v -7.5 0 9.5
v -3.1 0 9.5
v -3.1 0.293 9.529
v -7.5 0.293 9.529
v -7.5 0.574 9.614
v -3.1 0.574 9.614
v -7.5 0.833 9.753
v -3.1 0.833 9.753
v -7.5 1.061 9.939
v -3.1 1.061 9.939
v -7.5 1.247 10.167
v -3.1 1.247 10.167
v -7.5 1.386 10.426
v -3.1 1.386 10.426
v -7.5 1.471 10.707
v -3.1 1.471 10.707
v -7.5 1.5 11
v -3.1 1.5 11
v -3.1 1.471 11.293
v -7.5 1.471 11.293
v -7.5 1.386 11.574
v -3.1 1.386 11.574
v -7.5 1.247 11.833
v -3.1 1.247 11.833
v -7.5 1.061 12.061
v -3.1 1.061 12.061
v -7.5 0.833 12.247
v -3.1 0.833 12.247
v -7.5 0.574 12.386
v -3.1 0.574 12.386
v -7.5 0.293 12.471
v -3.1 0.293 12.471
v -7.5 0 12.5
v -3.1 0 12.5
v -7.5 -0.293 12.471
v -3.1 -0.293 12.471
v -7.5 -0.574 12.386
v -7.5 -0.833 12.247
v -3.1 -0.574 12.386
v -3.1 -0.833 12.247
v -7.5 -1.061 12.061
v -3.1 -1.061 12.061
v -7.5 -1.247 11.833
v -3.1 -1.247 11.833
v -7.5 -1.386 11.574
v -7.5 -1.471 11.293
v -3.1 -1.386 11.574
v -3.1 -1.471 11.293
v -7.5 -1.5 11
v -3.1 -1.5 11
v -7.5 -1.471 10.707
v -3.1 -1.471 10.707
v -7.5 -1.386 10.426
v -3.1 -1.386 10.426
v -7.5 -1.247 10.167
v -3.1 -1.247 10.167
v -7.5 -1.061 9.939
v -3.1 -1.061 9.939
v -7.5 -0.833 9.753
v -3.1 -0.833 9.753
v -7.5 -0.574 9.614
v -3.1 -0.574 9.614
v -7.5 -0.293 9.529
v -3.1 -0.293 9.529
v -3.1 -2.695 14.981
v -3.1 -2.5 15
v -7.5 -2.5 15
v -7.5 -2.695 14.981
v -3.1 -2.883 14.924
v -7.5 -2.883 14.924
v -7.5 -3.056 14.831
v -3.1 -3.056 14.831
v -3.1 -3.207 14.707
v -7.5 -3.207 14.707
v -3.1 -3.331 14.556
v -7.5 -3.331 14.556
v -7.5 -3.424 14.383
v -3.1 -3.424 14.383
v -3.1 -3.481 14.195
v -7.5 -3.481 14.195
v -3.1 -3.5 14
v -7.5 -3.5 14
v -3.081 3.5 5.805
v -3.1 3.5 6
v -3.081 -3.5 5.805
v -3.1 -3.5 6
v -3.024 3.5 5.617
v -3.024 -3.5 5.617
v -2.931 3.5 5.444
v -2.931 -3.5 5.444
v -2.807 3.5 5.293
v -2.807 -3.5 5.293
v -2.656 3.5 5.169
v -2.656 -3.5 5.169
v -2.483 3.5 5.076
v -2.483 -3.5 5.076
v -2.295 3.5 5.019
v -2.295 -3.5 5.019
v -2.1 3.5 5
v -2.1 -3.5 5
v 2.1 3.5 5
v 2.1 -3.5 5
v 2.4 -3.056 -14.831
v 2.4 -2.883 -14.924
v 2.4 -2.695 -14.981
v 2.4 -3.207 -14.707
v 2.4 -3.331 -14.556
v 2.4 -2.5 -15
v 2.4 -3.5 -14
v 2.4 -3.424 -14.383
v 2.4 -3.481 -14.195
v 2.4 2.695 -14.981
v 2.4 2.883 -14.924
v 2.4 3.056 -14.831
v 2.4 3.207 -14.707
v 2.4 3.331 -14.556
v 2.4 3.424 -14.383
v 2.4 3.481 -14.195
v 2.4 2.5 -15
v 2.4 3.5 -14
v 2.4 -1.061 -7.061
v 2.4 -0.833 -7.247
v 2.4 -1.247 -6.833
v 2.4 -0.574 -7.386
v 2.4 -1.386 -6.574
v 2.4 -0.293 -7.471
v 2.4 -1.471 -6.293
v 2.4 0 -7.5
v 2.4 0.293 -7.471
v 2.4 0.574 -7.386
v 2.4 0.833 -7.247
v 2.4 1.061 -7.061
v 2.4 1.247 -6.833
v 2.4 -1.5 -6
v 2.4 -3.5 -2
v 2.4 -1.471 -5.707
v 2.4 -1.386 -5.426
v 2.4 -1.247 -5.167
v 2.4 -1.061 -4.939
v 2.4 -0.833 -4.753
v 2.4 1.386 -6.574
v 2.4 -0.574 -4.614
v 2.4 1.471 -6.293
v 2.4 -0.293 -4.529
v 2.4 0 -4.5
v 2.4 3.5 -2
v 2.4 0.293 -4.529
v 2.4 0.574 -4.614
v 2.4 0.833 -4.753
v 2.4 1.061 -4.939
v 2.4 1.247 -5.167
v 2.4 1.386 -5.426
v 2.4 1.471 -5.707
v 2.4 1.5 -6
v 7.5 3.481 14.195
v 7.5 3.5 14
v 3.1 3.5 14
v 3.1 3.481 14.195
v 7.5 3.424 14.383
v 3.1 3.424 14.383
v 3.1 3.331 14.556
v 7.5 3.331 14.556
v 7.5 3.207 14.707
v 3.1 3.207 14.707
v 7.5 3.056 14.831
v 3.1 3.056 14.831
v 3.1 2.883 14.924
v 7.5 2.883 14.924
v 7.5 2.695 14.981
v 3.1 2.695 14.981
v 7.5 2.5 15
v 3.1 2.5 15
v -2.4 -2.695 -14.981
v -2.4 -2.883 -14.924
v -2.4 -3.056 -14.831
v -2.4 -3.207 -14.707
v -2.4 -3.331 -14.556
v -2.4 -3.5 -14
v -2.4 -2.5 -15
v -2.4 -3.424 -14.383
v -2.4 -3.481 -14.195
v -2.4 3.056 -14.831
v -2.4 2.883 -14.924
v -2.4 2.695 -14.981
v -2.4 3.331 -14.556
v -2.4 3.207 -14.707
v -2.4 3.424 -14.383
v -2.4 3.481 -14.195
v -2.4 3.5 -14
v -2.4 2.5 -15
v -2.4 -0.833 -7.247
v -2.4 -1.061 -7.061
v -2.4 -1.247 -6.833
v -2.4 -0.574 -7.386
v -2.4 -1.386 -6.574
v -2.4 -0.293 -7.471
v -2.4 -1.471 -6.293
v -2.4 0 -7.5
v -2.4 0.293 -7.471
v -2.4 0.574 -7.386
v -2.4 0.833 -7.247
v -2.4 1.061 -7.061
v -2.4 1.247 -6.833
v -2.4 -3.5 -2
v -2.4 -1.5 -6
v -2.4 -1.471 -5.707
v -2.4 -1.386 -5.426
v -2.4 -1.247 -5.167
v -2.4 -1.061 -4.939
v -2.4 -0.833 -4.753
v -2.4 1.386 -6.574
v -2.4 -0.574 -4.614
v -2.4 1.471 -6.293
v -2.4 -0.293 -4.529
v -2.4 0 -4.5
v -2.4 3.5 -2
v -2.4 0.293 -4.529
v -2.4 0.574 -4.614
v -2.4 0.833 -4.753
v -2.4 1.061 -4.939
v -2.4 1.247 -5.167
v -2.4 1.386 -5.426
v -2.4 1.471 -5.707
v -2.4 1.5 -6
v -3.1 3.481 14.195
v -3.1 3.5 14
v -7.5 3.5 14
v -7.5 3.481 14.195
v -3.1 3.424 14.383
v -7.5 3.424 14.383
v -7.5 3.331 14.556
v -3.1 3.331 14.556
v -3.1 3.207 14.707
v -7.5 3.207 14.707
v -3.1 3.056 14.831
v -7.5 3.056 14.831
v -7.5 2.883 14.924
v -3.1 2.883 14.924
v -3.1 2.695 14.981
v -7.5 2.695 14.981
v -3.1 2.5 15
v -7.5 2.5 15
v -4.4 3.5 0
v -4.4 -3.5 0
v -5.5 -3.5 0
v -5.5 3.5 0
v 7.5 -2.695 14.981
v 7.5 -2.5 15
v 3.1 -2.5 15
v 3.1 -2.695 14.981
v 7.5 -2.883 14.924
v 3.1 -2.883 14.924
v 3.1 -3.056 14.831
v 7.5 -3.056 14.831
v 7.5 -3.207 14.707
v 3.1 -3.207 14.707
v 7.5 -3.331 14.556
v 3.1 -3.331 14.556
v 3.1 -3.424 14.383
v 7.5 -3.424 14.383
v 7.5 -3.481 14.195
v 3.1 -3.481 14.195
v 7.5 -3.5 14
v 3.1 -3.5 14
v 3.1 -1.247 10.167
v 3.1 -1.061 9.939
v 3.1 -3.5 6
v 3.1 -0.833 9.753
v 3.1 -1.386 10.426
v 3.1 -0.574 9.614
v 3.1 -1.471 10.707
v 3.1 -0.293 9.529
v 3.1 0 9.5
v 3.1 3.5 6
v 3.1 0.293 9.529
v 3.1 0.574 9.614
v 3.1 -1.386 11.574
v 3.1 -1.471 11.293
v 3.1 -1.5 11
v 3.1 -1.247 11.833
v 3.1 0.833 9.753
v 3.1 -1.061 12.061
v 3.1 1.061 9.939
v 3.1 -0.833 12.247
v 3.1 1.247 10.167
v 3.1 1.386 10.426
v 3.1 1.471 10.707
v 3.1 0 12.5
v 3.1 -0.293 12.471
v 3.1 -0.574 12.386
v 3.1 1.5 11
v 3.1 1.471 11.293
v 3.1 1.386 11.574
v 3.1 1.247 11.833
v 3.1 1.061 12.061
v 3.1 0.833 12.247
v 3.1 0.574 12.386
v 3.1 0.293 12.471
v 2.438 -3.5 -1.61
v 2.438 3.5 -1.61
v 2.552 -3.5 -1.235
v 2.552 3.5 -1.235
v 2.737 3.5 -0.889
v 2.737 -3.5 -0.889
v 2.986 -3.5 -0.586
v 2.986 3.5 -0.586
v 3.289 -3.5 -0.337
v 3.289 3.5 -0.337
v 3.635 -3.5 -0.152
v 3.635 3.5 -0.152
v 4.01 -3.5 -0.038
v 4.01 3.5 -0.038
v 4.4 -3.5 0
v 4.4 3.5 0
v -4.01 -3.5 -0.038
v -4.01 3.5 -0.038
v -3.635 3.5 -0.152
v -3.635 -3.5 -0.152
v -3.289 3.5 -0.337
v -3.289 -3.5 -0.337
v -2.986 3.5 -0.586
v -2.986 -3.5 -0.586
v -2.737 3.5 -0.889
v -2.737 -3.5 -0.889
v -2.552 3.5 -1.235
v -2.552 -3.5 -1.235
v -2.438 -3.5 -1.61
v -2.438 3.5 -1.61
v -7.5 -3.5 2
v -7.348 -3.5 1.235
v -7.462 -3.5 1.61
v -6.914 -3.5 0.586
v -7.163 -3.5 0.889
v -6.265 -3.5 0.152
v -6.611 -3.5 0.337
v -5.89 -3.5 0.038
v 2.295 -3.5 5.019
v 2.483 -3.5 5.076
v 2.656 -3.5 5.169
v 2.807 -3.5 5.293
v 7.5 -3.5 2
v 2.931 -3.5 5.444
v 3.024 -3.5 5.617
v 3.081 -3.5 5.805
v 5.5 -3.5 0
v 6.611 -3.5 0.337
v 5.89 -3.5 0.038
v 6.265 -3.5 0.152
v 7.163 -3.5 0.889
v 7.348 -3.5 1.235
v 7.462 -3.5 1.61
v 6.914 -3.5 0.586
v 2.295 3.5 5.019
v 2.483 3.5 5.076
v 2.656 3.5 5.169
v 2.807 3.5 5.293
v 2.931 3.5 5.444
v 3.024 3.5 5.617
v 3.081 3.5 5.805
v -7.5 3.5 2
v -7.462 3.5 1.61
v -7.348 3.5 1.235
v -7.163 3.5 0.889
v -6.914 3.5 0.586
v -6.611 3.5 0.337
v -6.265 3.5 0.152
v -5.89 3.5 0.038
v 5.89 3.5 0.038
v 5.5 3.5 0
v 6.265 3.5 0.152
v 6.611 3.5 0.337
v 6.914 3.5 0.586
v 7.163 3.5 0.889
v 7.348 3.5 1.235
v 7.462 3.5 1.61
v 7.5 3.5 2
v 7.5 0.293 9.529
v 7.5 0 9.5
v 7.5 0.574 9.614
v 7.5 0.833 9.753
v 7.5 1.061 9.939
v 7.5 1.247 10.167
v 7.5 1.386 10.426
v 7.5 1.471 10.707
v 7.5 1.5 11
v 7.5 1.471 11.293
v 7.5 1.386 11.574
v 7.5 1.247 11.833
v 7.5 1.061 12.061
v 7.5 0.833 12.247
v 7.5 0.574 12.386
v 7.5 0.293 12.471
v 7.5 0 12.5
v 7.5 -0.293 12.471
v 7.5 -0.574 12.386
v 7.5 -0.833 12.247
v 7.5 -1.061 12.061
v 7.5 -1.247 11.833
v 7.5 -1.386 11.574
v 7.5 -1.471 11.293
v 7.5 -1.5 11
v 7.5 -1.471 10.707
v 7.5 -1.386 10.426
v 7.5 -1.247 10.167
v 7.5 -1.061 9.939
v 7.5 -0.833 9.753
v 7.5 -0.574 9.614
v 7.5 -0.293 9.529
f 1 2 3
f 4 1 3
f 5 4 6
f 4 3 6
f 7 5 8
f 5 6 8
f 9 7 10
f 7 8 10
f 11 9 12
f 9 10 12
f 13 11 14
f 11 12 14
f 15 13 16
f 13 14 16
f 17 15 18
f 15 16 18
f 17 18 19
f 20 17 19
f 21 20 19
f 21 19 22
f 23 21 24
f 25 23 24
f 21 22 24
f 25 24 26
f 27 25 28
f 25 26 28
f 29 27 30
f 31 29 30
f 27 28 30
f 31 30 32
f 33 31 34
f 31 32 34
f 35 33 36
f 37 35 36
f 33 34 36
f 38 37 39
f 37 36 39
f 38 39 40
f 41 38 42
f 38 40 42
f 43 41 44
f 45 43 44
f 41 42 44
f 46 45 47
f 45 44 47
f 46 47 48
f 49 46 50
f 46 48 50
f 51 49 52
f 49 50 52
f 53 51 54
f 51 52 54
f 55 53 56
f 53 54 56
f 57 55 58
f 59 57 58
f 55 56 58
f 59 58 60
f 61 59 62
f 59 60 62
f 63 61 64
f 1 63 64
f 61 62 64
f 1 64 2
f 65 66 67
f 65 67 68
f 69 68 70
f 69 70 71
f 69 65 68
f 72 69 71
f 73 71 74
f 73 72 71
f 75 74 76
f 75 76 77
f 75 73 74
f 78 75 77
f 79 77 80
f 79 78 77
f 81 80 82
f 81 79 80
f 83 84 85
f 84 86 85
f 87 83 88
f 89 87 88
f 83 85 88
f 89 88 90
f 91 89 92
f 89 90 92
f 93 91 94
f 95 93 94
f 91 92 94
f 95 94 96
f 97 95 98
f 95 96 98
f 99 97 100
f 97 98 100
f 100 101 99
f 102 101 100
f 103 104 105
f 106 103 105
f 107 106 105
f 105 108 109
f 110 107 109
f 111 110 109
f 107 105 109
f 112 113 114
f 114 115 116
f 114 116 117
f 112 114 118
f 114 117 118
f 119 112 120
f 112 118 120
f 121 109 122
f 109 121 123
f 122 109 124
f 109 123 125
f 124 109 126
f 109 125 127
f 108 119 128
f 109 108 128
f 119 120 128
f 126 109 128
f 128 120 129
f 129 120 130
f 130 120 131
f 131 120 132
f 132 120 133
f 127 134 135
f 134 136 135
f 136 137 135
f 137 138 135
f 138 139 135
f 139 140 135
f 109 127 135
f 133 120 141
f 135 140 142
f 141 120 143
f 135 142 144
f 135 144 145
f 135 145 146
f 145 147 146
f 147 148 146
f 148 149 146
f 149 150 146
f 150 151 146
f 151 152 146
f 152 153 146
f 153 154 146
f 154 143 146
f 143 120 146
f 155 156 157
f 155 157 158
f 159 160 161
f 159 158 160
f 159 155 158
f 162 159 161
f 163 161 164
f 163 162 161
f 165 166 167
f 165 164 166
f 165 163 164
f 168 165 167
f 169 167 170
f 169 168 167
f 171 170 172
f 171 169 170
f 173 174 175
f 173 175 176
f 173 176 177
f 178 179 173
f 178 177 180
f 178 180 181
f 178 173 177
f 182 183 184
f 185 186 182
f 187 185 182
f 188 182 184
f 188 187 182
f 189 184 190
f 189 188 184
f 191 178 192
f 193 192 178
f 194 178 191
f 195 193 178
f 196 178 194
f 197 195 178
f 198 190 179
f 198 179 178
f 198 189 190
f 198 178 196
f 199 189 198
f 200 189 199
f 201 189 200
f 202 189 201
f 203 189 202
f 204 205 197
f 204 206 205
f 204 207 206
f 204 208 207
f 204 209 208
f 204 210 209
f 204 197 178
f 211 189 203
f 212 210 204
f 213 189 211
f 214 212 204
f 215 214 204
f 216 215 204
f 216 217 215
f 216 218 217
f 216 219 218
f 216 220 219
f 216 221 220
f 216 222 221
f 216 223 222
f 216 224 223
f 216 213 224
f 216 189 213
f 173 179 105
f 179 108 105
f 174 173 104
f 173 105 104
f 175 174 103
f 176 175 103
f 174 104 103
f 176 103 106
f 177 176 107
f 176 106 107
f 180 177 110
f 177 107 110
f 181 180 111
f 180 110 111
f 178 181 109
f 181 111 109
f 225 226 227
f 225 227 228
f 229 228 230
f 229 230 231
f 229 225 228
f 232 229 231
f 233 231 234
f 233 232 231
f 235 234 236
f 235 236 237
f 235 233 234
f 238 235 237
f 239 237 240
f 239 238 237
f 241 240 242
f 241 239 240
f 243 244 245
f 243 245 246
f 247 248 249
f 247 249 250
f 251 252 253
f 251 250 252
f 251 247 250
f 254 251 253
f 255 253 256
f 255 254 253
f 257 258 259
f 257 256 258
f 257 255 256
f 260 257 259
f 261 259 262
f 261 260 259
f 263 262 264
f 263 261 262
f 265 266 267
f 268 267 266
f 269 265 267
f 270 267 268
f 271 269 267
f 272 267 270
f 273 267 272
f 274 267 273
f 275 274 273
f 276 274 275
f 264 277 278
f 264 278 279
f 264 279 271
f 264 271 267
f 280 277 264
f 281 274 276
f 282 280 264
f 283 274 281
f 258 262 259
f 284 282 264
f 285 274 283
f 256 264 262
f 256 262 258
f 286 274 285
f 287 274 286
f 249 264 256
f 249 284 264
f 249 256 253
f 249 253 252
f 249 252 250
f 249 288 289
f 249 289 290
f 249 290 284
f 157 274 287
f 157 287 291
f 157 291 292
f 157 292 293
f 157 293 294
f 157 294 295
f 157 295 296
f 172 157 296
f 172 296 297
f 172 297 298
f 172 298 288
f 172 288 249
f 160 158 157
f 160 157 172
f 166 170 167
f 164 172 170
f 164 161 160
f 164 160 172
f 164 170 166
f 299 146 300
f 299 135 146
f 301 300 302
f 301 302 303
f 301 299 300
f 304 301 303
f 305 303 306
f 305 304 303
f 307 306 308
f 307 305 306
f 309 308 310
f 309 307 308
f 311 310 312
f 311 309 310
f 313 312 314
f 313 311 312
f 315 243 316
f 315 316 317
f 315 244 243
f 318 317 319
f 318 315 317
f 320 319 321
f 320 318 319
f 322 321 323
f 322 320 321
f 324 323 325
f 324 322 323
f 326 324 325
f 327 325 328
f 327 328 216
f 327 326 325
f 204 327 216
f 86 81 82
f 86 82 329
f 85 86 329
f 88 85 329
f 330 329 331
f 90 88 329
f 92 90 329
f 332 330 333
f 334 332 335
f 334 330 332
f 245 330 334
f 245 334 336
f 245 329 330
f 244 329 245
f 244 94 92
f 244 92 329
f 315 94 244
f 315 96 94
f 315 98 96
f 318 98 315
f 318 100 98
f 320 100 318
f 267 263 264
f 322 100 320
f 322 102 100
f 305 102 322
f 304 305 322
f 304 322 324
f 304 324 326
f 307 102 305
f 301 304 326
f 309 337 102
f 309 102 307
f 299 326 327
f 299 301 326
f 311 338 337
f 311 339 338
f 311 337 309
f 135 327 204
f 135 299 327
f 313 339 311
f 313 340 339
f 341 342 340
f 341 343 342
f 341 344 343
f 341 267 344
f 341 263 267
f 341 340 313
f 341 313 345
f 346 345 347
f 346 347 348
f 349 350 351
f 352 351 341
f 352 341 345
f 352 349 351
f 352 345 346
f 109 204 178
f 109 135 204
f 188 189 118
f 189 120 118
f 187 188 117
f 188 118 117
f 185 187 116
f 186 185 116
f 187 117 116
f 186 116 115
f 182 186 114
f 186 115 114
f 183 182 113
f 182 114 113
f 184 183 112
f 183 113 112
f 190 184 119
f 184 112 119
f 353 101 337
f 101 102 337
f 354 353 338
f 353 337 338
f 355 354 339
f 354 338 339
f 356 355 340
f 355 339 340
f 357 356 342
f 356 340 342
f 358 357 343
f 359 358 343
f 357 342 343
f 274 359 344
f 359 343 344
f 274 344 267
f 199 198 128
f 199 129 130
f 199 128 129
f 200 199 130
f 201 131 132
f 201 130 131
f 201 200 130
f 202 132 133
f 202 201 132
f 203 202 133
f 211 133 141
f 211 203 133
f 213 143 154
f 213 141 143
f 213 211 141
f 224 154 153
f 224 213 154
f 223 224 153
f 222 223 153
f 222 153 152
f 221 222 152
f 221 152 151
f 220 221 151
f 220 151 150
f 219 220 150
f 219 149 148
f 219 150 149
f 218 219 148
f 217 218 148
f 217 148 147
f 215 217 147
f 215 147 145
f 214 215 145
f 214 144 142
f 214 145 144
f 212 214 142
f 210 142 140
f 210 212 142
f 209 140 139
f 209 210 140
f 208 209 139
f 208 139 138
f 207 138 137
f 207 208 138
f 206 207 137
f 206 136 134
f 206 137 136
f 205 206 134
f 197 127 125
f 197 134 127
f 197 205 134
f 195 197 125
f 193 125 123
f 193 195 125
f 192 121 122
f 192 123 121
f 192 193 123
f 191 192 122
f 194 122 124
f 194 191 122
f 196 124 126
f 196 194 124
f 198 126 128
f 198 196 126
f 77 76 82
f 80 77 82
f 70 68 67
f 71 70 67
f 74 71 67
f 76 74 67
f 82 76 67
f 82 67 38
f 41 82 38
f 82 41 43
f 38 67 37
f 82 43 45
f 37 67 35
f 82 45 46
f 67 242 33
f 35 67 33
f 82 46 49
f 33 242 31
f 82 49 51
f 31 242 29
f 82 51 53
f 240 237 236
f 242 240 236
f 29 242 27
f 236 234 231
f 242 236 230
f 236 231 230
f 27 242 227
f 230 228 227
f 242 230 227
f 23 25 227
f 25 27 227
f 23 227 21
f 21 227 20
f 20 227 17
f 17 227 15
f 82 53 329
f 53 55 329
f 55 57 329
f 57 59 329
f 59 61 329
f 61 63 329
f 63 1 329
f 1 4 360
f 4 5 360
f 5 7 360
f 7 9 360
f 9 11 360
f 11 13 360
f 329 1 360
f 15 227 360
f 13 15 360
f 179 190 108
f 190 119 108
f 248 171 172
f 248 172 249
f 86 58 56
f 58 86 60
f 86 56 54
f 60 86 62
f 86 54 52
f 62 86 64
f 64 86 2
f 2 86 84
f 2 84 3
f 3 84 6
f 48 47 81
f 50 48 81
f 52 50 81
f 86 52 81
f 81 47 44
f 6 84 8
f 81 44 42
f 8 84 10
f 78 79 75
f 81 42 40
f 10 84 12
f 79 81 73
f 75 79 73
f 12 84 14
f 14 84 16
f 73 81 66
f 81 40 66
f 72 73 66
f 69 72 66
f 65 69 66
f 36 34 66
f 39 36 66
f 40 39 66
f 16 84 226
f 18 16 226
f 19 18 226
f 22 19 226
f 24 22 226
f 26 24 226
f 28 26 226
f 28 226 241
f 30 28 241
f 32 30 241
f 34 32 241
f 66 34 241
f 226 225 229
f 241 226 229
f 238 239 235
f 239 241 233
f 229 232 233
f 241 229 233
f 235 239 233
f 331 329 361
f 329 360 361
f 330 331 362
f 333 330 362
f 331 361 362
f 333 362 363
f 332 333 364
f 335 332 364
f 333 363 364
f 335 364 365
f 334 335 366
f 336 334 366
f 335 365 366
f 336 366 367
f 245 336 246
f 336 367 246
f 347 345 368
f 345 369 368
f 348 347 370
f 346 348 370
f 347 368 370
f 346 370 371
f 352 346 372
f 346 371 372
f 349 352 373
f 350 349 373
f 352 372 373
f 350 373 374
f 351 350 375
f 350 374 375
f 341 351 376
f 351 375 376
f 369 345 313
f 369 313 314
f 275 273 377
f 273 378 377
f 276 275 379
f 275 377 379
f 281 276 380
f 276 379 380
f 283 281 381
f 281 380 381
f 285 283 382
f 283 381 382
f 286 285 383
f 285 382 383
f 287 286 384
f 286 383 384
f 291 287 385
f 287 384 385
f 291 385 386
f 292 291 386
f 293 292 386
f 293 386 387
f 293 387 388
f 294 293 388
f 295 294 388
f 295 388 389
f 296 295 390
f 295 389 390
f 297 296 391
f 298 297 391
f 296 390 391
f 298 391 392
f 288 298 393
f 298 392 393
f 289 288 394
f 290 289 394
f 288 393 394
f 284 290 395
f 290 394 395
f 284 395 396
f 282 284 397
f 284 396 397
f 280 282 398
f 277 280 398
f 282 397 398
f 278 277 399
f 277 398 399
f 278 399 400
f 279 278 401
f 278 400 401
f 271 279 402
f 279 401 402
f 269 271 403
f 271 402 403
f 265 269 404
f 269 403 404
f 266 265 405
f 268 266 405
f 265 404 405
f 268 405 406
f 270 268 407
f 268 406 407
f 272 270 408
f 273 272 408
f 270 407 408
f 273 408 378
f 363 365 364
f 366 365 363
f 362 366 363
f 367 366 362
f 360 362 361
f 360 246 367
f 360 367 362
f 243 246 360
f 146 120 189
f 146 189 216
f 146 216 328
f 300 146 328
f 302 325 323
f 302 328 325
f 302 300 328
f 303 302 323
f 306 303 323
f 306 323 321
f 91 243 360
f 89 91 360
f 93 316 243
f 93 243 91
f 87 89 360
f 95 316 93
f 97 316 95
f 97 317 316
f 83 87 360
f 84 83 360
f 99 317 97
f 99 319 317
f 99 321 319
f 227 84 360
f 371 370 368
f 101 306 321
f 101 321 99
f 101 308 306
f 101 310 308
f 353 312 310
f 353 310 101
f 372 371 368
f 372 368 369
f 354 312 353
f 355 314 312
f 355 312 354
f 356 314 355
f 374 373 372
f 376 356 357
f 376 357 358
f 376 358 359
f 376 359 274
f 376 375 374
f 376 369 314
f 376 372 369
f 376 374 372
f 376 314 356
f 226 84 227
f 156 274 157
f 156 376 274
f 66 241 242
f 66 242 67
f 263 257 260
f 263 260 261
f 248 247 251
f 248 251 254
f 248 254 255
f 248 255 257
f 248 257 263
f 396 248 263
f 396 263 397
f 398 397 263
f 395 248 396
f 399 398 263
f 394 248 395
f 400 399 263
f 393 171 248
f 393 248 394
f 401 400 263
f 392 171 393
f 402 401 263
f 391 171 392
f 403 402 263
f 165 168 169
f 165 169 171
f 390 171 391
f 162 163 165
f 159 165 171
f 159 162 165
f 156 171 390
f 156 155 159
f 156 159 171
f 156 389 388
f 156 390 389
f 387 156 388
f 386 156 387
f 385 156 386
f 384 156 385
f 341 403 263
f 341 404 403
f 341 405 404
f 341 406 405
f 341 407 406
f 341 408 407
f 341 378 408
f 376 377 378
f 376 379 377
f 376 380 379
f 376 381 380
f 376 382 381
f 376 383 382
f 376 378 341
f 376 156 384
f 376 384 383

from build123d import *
from build123d.topology import SkipClean

# Parameters (mm, degrees)
SALIENTE_EXTRUIR1_DEPTH    = 2.4
CORTAR_EXTRUIR1_DEPTH      = 16.588778015
CORTAR_EXTRUIR1_DEPTH_BACK = 16.588778015
CROQUIS2_R                 = 1.5
CROQUIS3_R                 = 1.5
SALIENTE_EXTRUIR2_DEPTH    = 7.5
CORTAR_EXTRUIR2_DEPTH      = 3.1
REDONDEO1_R                = 2
REDONDEO2_R                = 1


with BuildPart() as part:
    # Croquis1 → Saliente-Extruir1 (new, symmetric)
    with BuildSketch(Plane(origin=(0, 0, 0), x_dir=(0, 0, -1), z_dir=(1, 0, 0))):
        with BuildLine():
            Line((-14, 3.5), (14, 3.5))
            ThreePointArc((14, 3.5), (14.707106781, 3.207106781), (15, 2.5))
            Line((15, 2.5), (15, -2.5))
            ThreePointArc((15, -2.5), (14.707106781, -3.207106781), (14, -3.5))
            Line((14, -3.5), (-14, -3.5))
            ThreePointArc((-14, -3.5), (-14.707106781, -3.207106781), (-15, -2.5))
            Line((-15, -2.5), (-15, 2.5))
            ThreePointArc((-15, 2.5), (-14.707106781, 3.207106781), (-14, 3.5))
        make_face()
    extrude(amount=SALIENTE_EXTRUIR1_DEPTH, both=True)

    # Croquis2 → Cortar-Extruir1 (cut, two sides: drawn at the far end of the back side and taken through both)
    with BuildSketch(Plane(origin=(0, 0, 0), x_dir=(0, 0, -1), z_dir=(1, 0, 0)).offset(-CORTAR_EXTRUIR1_DEPTH_BACK)):
        with Locations((-11, 0)):
            Circle(CROQUIS2_R)
        with Locations((6, 0)):
            Circle(CROQUIS2_R)
    extrude(amount=CORTAR_EXTRUIR1_DEPTH + CORTAR_EXTRUIR1_DEPTH_BACK, mode=Mode.SUBTRACT)

    # Croquis3 → Saliente-Extruir2 (add, symmetric)
    with SkipClean():  # the faces are left unmerged after this step: merging them gives an invalid solid
        with BuildSketch(Plane(origin=(0, 0, 0), x_dir=(0, 0, -1), z_dir=(1, 0, 0))):
            with BuildLine():
                Line((-15, 2.5), (-15, -2.5))
                ThreePointArc((-15, -2.5), (-14.707106781, -3.207106781), (-14, -3.5))
                Line((-14, -3.5), (0, -3.5))
                Line((0, -3.5), (0, 3.5))
                Line((0, 3.5), (-14, 3.5))
                ThreePointArc((-14, 3.5), (-14.707106781, 3.207106781), (-15, 2.5))
            make_face()
            with Locations((-11, 0)):
                Circle(CROQUIS3_R, mode=Mode.SUBTRACT)
        extrude(amount=SALIENTE_EXTRUIR2_DEPTH, both=True)
    add(part.part.scale(1), mode=Mode.REPLACE)  # the faces are merged on a copy

    # Croquis4 → Cortar-Extruir2 (cut, symmetric)
    with BuildSketch(Plane(origin=(0, 0, 0), x_dir=(0, 0, -1), z_dir=(1, 0, 0))):
        with BuildLine():
            Line((-14, 3.5), (-5, 3.5))
            Line((-5, 3.5), (-5, -3.5))
            Line((-5, -3.5), (-14, -3.5))
            ThreePointArc((-14, -3.5), (-14.707106781, -3.207106781), (-15, -2.5))
            Line((-15, -2.5), (-15, 2.5))
            ThreePointArc((-15, 2.5), (-14.707106781, 3.207106781), (-14, 3.5))
        make_face()
    extrude(amount=CORTAR_EXTRUIR2_DEPTH, both=True, mode=Mode.SUBTRACT)

    # Redondeo1
    redondeo1_edges = [part.edges().sort_by_distance(p)[0] for p in [
        (-2.4, 0, 0),
        (2.4, 0, 0),
        (-7.5, 0, 0),
        (7.5, 0, 0),
    ]]
    fillet(redondeo1_edges, radius=REDONDEO1_R)

    # Redondeo2
    redondeo2_edges = [part.edges().sort_by_distance(p)[0] for p in [
        (3.1, 0, 5),
        (-3.1, 0, 5),
    ]]
    fillet(redondeo2_edges, radius=REDONDEO2_R)


solid = part.part
